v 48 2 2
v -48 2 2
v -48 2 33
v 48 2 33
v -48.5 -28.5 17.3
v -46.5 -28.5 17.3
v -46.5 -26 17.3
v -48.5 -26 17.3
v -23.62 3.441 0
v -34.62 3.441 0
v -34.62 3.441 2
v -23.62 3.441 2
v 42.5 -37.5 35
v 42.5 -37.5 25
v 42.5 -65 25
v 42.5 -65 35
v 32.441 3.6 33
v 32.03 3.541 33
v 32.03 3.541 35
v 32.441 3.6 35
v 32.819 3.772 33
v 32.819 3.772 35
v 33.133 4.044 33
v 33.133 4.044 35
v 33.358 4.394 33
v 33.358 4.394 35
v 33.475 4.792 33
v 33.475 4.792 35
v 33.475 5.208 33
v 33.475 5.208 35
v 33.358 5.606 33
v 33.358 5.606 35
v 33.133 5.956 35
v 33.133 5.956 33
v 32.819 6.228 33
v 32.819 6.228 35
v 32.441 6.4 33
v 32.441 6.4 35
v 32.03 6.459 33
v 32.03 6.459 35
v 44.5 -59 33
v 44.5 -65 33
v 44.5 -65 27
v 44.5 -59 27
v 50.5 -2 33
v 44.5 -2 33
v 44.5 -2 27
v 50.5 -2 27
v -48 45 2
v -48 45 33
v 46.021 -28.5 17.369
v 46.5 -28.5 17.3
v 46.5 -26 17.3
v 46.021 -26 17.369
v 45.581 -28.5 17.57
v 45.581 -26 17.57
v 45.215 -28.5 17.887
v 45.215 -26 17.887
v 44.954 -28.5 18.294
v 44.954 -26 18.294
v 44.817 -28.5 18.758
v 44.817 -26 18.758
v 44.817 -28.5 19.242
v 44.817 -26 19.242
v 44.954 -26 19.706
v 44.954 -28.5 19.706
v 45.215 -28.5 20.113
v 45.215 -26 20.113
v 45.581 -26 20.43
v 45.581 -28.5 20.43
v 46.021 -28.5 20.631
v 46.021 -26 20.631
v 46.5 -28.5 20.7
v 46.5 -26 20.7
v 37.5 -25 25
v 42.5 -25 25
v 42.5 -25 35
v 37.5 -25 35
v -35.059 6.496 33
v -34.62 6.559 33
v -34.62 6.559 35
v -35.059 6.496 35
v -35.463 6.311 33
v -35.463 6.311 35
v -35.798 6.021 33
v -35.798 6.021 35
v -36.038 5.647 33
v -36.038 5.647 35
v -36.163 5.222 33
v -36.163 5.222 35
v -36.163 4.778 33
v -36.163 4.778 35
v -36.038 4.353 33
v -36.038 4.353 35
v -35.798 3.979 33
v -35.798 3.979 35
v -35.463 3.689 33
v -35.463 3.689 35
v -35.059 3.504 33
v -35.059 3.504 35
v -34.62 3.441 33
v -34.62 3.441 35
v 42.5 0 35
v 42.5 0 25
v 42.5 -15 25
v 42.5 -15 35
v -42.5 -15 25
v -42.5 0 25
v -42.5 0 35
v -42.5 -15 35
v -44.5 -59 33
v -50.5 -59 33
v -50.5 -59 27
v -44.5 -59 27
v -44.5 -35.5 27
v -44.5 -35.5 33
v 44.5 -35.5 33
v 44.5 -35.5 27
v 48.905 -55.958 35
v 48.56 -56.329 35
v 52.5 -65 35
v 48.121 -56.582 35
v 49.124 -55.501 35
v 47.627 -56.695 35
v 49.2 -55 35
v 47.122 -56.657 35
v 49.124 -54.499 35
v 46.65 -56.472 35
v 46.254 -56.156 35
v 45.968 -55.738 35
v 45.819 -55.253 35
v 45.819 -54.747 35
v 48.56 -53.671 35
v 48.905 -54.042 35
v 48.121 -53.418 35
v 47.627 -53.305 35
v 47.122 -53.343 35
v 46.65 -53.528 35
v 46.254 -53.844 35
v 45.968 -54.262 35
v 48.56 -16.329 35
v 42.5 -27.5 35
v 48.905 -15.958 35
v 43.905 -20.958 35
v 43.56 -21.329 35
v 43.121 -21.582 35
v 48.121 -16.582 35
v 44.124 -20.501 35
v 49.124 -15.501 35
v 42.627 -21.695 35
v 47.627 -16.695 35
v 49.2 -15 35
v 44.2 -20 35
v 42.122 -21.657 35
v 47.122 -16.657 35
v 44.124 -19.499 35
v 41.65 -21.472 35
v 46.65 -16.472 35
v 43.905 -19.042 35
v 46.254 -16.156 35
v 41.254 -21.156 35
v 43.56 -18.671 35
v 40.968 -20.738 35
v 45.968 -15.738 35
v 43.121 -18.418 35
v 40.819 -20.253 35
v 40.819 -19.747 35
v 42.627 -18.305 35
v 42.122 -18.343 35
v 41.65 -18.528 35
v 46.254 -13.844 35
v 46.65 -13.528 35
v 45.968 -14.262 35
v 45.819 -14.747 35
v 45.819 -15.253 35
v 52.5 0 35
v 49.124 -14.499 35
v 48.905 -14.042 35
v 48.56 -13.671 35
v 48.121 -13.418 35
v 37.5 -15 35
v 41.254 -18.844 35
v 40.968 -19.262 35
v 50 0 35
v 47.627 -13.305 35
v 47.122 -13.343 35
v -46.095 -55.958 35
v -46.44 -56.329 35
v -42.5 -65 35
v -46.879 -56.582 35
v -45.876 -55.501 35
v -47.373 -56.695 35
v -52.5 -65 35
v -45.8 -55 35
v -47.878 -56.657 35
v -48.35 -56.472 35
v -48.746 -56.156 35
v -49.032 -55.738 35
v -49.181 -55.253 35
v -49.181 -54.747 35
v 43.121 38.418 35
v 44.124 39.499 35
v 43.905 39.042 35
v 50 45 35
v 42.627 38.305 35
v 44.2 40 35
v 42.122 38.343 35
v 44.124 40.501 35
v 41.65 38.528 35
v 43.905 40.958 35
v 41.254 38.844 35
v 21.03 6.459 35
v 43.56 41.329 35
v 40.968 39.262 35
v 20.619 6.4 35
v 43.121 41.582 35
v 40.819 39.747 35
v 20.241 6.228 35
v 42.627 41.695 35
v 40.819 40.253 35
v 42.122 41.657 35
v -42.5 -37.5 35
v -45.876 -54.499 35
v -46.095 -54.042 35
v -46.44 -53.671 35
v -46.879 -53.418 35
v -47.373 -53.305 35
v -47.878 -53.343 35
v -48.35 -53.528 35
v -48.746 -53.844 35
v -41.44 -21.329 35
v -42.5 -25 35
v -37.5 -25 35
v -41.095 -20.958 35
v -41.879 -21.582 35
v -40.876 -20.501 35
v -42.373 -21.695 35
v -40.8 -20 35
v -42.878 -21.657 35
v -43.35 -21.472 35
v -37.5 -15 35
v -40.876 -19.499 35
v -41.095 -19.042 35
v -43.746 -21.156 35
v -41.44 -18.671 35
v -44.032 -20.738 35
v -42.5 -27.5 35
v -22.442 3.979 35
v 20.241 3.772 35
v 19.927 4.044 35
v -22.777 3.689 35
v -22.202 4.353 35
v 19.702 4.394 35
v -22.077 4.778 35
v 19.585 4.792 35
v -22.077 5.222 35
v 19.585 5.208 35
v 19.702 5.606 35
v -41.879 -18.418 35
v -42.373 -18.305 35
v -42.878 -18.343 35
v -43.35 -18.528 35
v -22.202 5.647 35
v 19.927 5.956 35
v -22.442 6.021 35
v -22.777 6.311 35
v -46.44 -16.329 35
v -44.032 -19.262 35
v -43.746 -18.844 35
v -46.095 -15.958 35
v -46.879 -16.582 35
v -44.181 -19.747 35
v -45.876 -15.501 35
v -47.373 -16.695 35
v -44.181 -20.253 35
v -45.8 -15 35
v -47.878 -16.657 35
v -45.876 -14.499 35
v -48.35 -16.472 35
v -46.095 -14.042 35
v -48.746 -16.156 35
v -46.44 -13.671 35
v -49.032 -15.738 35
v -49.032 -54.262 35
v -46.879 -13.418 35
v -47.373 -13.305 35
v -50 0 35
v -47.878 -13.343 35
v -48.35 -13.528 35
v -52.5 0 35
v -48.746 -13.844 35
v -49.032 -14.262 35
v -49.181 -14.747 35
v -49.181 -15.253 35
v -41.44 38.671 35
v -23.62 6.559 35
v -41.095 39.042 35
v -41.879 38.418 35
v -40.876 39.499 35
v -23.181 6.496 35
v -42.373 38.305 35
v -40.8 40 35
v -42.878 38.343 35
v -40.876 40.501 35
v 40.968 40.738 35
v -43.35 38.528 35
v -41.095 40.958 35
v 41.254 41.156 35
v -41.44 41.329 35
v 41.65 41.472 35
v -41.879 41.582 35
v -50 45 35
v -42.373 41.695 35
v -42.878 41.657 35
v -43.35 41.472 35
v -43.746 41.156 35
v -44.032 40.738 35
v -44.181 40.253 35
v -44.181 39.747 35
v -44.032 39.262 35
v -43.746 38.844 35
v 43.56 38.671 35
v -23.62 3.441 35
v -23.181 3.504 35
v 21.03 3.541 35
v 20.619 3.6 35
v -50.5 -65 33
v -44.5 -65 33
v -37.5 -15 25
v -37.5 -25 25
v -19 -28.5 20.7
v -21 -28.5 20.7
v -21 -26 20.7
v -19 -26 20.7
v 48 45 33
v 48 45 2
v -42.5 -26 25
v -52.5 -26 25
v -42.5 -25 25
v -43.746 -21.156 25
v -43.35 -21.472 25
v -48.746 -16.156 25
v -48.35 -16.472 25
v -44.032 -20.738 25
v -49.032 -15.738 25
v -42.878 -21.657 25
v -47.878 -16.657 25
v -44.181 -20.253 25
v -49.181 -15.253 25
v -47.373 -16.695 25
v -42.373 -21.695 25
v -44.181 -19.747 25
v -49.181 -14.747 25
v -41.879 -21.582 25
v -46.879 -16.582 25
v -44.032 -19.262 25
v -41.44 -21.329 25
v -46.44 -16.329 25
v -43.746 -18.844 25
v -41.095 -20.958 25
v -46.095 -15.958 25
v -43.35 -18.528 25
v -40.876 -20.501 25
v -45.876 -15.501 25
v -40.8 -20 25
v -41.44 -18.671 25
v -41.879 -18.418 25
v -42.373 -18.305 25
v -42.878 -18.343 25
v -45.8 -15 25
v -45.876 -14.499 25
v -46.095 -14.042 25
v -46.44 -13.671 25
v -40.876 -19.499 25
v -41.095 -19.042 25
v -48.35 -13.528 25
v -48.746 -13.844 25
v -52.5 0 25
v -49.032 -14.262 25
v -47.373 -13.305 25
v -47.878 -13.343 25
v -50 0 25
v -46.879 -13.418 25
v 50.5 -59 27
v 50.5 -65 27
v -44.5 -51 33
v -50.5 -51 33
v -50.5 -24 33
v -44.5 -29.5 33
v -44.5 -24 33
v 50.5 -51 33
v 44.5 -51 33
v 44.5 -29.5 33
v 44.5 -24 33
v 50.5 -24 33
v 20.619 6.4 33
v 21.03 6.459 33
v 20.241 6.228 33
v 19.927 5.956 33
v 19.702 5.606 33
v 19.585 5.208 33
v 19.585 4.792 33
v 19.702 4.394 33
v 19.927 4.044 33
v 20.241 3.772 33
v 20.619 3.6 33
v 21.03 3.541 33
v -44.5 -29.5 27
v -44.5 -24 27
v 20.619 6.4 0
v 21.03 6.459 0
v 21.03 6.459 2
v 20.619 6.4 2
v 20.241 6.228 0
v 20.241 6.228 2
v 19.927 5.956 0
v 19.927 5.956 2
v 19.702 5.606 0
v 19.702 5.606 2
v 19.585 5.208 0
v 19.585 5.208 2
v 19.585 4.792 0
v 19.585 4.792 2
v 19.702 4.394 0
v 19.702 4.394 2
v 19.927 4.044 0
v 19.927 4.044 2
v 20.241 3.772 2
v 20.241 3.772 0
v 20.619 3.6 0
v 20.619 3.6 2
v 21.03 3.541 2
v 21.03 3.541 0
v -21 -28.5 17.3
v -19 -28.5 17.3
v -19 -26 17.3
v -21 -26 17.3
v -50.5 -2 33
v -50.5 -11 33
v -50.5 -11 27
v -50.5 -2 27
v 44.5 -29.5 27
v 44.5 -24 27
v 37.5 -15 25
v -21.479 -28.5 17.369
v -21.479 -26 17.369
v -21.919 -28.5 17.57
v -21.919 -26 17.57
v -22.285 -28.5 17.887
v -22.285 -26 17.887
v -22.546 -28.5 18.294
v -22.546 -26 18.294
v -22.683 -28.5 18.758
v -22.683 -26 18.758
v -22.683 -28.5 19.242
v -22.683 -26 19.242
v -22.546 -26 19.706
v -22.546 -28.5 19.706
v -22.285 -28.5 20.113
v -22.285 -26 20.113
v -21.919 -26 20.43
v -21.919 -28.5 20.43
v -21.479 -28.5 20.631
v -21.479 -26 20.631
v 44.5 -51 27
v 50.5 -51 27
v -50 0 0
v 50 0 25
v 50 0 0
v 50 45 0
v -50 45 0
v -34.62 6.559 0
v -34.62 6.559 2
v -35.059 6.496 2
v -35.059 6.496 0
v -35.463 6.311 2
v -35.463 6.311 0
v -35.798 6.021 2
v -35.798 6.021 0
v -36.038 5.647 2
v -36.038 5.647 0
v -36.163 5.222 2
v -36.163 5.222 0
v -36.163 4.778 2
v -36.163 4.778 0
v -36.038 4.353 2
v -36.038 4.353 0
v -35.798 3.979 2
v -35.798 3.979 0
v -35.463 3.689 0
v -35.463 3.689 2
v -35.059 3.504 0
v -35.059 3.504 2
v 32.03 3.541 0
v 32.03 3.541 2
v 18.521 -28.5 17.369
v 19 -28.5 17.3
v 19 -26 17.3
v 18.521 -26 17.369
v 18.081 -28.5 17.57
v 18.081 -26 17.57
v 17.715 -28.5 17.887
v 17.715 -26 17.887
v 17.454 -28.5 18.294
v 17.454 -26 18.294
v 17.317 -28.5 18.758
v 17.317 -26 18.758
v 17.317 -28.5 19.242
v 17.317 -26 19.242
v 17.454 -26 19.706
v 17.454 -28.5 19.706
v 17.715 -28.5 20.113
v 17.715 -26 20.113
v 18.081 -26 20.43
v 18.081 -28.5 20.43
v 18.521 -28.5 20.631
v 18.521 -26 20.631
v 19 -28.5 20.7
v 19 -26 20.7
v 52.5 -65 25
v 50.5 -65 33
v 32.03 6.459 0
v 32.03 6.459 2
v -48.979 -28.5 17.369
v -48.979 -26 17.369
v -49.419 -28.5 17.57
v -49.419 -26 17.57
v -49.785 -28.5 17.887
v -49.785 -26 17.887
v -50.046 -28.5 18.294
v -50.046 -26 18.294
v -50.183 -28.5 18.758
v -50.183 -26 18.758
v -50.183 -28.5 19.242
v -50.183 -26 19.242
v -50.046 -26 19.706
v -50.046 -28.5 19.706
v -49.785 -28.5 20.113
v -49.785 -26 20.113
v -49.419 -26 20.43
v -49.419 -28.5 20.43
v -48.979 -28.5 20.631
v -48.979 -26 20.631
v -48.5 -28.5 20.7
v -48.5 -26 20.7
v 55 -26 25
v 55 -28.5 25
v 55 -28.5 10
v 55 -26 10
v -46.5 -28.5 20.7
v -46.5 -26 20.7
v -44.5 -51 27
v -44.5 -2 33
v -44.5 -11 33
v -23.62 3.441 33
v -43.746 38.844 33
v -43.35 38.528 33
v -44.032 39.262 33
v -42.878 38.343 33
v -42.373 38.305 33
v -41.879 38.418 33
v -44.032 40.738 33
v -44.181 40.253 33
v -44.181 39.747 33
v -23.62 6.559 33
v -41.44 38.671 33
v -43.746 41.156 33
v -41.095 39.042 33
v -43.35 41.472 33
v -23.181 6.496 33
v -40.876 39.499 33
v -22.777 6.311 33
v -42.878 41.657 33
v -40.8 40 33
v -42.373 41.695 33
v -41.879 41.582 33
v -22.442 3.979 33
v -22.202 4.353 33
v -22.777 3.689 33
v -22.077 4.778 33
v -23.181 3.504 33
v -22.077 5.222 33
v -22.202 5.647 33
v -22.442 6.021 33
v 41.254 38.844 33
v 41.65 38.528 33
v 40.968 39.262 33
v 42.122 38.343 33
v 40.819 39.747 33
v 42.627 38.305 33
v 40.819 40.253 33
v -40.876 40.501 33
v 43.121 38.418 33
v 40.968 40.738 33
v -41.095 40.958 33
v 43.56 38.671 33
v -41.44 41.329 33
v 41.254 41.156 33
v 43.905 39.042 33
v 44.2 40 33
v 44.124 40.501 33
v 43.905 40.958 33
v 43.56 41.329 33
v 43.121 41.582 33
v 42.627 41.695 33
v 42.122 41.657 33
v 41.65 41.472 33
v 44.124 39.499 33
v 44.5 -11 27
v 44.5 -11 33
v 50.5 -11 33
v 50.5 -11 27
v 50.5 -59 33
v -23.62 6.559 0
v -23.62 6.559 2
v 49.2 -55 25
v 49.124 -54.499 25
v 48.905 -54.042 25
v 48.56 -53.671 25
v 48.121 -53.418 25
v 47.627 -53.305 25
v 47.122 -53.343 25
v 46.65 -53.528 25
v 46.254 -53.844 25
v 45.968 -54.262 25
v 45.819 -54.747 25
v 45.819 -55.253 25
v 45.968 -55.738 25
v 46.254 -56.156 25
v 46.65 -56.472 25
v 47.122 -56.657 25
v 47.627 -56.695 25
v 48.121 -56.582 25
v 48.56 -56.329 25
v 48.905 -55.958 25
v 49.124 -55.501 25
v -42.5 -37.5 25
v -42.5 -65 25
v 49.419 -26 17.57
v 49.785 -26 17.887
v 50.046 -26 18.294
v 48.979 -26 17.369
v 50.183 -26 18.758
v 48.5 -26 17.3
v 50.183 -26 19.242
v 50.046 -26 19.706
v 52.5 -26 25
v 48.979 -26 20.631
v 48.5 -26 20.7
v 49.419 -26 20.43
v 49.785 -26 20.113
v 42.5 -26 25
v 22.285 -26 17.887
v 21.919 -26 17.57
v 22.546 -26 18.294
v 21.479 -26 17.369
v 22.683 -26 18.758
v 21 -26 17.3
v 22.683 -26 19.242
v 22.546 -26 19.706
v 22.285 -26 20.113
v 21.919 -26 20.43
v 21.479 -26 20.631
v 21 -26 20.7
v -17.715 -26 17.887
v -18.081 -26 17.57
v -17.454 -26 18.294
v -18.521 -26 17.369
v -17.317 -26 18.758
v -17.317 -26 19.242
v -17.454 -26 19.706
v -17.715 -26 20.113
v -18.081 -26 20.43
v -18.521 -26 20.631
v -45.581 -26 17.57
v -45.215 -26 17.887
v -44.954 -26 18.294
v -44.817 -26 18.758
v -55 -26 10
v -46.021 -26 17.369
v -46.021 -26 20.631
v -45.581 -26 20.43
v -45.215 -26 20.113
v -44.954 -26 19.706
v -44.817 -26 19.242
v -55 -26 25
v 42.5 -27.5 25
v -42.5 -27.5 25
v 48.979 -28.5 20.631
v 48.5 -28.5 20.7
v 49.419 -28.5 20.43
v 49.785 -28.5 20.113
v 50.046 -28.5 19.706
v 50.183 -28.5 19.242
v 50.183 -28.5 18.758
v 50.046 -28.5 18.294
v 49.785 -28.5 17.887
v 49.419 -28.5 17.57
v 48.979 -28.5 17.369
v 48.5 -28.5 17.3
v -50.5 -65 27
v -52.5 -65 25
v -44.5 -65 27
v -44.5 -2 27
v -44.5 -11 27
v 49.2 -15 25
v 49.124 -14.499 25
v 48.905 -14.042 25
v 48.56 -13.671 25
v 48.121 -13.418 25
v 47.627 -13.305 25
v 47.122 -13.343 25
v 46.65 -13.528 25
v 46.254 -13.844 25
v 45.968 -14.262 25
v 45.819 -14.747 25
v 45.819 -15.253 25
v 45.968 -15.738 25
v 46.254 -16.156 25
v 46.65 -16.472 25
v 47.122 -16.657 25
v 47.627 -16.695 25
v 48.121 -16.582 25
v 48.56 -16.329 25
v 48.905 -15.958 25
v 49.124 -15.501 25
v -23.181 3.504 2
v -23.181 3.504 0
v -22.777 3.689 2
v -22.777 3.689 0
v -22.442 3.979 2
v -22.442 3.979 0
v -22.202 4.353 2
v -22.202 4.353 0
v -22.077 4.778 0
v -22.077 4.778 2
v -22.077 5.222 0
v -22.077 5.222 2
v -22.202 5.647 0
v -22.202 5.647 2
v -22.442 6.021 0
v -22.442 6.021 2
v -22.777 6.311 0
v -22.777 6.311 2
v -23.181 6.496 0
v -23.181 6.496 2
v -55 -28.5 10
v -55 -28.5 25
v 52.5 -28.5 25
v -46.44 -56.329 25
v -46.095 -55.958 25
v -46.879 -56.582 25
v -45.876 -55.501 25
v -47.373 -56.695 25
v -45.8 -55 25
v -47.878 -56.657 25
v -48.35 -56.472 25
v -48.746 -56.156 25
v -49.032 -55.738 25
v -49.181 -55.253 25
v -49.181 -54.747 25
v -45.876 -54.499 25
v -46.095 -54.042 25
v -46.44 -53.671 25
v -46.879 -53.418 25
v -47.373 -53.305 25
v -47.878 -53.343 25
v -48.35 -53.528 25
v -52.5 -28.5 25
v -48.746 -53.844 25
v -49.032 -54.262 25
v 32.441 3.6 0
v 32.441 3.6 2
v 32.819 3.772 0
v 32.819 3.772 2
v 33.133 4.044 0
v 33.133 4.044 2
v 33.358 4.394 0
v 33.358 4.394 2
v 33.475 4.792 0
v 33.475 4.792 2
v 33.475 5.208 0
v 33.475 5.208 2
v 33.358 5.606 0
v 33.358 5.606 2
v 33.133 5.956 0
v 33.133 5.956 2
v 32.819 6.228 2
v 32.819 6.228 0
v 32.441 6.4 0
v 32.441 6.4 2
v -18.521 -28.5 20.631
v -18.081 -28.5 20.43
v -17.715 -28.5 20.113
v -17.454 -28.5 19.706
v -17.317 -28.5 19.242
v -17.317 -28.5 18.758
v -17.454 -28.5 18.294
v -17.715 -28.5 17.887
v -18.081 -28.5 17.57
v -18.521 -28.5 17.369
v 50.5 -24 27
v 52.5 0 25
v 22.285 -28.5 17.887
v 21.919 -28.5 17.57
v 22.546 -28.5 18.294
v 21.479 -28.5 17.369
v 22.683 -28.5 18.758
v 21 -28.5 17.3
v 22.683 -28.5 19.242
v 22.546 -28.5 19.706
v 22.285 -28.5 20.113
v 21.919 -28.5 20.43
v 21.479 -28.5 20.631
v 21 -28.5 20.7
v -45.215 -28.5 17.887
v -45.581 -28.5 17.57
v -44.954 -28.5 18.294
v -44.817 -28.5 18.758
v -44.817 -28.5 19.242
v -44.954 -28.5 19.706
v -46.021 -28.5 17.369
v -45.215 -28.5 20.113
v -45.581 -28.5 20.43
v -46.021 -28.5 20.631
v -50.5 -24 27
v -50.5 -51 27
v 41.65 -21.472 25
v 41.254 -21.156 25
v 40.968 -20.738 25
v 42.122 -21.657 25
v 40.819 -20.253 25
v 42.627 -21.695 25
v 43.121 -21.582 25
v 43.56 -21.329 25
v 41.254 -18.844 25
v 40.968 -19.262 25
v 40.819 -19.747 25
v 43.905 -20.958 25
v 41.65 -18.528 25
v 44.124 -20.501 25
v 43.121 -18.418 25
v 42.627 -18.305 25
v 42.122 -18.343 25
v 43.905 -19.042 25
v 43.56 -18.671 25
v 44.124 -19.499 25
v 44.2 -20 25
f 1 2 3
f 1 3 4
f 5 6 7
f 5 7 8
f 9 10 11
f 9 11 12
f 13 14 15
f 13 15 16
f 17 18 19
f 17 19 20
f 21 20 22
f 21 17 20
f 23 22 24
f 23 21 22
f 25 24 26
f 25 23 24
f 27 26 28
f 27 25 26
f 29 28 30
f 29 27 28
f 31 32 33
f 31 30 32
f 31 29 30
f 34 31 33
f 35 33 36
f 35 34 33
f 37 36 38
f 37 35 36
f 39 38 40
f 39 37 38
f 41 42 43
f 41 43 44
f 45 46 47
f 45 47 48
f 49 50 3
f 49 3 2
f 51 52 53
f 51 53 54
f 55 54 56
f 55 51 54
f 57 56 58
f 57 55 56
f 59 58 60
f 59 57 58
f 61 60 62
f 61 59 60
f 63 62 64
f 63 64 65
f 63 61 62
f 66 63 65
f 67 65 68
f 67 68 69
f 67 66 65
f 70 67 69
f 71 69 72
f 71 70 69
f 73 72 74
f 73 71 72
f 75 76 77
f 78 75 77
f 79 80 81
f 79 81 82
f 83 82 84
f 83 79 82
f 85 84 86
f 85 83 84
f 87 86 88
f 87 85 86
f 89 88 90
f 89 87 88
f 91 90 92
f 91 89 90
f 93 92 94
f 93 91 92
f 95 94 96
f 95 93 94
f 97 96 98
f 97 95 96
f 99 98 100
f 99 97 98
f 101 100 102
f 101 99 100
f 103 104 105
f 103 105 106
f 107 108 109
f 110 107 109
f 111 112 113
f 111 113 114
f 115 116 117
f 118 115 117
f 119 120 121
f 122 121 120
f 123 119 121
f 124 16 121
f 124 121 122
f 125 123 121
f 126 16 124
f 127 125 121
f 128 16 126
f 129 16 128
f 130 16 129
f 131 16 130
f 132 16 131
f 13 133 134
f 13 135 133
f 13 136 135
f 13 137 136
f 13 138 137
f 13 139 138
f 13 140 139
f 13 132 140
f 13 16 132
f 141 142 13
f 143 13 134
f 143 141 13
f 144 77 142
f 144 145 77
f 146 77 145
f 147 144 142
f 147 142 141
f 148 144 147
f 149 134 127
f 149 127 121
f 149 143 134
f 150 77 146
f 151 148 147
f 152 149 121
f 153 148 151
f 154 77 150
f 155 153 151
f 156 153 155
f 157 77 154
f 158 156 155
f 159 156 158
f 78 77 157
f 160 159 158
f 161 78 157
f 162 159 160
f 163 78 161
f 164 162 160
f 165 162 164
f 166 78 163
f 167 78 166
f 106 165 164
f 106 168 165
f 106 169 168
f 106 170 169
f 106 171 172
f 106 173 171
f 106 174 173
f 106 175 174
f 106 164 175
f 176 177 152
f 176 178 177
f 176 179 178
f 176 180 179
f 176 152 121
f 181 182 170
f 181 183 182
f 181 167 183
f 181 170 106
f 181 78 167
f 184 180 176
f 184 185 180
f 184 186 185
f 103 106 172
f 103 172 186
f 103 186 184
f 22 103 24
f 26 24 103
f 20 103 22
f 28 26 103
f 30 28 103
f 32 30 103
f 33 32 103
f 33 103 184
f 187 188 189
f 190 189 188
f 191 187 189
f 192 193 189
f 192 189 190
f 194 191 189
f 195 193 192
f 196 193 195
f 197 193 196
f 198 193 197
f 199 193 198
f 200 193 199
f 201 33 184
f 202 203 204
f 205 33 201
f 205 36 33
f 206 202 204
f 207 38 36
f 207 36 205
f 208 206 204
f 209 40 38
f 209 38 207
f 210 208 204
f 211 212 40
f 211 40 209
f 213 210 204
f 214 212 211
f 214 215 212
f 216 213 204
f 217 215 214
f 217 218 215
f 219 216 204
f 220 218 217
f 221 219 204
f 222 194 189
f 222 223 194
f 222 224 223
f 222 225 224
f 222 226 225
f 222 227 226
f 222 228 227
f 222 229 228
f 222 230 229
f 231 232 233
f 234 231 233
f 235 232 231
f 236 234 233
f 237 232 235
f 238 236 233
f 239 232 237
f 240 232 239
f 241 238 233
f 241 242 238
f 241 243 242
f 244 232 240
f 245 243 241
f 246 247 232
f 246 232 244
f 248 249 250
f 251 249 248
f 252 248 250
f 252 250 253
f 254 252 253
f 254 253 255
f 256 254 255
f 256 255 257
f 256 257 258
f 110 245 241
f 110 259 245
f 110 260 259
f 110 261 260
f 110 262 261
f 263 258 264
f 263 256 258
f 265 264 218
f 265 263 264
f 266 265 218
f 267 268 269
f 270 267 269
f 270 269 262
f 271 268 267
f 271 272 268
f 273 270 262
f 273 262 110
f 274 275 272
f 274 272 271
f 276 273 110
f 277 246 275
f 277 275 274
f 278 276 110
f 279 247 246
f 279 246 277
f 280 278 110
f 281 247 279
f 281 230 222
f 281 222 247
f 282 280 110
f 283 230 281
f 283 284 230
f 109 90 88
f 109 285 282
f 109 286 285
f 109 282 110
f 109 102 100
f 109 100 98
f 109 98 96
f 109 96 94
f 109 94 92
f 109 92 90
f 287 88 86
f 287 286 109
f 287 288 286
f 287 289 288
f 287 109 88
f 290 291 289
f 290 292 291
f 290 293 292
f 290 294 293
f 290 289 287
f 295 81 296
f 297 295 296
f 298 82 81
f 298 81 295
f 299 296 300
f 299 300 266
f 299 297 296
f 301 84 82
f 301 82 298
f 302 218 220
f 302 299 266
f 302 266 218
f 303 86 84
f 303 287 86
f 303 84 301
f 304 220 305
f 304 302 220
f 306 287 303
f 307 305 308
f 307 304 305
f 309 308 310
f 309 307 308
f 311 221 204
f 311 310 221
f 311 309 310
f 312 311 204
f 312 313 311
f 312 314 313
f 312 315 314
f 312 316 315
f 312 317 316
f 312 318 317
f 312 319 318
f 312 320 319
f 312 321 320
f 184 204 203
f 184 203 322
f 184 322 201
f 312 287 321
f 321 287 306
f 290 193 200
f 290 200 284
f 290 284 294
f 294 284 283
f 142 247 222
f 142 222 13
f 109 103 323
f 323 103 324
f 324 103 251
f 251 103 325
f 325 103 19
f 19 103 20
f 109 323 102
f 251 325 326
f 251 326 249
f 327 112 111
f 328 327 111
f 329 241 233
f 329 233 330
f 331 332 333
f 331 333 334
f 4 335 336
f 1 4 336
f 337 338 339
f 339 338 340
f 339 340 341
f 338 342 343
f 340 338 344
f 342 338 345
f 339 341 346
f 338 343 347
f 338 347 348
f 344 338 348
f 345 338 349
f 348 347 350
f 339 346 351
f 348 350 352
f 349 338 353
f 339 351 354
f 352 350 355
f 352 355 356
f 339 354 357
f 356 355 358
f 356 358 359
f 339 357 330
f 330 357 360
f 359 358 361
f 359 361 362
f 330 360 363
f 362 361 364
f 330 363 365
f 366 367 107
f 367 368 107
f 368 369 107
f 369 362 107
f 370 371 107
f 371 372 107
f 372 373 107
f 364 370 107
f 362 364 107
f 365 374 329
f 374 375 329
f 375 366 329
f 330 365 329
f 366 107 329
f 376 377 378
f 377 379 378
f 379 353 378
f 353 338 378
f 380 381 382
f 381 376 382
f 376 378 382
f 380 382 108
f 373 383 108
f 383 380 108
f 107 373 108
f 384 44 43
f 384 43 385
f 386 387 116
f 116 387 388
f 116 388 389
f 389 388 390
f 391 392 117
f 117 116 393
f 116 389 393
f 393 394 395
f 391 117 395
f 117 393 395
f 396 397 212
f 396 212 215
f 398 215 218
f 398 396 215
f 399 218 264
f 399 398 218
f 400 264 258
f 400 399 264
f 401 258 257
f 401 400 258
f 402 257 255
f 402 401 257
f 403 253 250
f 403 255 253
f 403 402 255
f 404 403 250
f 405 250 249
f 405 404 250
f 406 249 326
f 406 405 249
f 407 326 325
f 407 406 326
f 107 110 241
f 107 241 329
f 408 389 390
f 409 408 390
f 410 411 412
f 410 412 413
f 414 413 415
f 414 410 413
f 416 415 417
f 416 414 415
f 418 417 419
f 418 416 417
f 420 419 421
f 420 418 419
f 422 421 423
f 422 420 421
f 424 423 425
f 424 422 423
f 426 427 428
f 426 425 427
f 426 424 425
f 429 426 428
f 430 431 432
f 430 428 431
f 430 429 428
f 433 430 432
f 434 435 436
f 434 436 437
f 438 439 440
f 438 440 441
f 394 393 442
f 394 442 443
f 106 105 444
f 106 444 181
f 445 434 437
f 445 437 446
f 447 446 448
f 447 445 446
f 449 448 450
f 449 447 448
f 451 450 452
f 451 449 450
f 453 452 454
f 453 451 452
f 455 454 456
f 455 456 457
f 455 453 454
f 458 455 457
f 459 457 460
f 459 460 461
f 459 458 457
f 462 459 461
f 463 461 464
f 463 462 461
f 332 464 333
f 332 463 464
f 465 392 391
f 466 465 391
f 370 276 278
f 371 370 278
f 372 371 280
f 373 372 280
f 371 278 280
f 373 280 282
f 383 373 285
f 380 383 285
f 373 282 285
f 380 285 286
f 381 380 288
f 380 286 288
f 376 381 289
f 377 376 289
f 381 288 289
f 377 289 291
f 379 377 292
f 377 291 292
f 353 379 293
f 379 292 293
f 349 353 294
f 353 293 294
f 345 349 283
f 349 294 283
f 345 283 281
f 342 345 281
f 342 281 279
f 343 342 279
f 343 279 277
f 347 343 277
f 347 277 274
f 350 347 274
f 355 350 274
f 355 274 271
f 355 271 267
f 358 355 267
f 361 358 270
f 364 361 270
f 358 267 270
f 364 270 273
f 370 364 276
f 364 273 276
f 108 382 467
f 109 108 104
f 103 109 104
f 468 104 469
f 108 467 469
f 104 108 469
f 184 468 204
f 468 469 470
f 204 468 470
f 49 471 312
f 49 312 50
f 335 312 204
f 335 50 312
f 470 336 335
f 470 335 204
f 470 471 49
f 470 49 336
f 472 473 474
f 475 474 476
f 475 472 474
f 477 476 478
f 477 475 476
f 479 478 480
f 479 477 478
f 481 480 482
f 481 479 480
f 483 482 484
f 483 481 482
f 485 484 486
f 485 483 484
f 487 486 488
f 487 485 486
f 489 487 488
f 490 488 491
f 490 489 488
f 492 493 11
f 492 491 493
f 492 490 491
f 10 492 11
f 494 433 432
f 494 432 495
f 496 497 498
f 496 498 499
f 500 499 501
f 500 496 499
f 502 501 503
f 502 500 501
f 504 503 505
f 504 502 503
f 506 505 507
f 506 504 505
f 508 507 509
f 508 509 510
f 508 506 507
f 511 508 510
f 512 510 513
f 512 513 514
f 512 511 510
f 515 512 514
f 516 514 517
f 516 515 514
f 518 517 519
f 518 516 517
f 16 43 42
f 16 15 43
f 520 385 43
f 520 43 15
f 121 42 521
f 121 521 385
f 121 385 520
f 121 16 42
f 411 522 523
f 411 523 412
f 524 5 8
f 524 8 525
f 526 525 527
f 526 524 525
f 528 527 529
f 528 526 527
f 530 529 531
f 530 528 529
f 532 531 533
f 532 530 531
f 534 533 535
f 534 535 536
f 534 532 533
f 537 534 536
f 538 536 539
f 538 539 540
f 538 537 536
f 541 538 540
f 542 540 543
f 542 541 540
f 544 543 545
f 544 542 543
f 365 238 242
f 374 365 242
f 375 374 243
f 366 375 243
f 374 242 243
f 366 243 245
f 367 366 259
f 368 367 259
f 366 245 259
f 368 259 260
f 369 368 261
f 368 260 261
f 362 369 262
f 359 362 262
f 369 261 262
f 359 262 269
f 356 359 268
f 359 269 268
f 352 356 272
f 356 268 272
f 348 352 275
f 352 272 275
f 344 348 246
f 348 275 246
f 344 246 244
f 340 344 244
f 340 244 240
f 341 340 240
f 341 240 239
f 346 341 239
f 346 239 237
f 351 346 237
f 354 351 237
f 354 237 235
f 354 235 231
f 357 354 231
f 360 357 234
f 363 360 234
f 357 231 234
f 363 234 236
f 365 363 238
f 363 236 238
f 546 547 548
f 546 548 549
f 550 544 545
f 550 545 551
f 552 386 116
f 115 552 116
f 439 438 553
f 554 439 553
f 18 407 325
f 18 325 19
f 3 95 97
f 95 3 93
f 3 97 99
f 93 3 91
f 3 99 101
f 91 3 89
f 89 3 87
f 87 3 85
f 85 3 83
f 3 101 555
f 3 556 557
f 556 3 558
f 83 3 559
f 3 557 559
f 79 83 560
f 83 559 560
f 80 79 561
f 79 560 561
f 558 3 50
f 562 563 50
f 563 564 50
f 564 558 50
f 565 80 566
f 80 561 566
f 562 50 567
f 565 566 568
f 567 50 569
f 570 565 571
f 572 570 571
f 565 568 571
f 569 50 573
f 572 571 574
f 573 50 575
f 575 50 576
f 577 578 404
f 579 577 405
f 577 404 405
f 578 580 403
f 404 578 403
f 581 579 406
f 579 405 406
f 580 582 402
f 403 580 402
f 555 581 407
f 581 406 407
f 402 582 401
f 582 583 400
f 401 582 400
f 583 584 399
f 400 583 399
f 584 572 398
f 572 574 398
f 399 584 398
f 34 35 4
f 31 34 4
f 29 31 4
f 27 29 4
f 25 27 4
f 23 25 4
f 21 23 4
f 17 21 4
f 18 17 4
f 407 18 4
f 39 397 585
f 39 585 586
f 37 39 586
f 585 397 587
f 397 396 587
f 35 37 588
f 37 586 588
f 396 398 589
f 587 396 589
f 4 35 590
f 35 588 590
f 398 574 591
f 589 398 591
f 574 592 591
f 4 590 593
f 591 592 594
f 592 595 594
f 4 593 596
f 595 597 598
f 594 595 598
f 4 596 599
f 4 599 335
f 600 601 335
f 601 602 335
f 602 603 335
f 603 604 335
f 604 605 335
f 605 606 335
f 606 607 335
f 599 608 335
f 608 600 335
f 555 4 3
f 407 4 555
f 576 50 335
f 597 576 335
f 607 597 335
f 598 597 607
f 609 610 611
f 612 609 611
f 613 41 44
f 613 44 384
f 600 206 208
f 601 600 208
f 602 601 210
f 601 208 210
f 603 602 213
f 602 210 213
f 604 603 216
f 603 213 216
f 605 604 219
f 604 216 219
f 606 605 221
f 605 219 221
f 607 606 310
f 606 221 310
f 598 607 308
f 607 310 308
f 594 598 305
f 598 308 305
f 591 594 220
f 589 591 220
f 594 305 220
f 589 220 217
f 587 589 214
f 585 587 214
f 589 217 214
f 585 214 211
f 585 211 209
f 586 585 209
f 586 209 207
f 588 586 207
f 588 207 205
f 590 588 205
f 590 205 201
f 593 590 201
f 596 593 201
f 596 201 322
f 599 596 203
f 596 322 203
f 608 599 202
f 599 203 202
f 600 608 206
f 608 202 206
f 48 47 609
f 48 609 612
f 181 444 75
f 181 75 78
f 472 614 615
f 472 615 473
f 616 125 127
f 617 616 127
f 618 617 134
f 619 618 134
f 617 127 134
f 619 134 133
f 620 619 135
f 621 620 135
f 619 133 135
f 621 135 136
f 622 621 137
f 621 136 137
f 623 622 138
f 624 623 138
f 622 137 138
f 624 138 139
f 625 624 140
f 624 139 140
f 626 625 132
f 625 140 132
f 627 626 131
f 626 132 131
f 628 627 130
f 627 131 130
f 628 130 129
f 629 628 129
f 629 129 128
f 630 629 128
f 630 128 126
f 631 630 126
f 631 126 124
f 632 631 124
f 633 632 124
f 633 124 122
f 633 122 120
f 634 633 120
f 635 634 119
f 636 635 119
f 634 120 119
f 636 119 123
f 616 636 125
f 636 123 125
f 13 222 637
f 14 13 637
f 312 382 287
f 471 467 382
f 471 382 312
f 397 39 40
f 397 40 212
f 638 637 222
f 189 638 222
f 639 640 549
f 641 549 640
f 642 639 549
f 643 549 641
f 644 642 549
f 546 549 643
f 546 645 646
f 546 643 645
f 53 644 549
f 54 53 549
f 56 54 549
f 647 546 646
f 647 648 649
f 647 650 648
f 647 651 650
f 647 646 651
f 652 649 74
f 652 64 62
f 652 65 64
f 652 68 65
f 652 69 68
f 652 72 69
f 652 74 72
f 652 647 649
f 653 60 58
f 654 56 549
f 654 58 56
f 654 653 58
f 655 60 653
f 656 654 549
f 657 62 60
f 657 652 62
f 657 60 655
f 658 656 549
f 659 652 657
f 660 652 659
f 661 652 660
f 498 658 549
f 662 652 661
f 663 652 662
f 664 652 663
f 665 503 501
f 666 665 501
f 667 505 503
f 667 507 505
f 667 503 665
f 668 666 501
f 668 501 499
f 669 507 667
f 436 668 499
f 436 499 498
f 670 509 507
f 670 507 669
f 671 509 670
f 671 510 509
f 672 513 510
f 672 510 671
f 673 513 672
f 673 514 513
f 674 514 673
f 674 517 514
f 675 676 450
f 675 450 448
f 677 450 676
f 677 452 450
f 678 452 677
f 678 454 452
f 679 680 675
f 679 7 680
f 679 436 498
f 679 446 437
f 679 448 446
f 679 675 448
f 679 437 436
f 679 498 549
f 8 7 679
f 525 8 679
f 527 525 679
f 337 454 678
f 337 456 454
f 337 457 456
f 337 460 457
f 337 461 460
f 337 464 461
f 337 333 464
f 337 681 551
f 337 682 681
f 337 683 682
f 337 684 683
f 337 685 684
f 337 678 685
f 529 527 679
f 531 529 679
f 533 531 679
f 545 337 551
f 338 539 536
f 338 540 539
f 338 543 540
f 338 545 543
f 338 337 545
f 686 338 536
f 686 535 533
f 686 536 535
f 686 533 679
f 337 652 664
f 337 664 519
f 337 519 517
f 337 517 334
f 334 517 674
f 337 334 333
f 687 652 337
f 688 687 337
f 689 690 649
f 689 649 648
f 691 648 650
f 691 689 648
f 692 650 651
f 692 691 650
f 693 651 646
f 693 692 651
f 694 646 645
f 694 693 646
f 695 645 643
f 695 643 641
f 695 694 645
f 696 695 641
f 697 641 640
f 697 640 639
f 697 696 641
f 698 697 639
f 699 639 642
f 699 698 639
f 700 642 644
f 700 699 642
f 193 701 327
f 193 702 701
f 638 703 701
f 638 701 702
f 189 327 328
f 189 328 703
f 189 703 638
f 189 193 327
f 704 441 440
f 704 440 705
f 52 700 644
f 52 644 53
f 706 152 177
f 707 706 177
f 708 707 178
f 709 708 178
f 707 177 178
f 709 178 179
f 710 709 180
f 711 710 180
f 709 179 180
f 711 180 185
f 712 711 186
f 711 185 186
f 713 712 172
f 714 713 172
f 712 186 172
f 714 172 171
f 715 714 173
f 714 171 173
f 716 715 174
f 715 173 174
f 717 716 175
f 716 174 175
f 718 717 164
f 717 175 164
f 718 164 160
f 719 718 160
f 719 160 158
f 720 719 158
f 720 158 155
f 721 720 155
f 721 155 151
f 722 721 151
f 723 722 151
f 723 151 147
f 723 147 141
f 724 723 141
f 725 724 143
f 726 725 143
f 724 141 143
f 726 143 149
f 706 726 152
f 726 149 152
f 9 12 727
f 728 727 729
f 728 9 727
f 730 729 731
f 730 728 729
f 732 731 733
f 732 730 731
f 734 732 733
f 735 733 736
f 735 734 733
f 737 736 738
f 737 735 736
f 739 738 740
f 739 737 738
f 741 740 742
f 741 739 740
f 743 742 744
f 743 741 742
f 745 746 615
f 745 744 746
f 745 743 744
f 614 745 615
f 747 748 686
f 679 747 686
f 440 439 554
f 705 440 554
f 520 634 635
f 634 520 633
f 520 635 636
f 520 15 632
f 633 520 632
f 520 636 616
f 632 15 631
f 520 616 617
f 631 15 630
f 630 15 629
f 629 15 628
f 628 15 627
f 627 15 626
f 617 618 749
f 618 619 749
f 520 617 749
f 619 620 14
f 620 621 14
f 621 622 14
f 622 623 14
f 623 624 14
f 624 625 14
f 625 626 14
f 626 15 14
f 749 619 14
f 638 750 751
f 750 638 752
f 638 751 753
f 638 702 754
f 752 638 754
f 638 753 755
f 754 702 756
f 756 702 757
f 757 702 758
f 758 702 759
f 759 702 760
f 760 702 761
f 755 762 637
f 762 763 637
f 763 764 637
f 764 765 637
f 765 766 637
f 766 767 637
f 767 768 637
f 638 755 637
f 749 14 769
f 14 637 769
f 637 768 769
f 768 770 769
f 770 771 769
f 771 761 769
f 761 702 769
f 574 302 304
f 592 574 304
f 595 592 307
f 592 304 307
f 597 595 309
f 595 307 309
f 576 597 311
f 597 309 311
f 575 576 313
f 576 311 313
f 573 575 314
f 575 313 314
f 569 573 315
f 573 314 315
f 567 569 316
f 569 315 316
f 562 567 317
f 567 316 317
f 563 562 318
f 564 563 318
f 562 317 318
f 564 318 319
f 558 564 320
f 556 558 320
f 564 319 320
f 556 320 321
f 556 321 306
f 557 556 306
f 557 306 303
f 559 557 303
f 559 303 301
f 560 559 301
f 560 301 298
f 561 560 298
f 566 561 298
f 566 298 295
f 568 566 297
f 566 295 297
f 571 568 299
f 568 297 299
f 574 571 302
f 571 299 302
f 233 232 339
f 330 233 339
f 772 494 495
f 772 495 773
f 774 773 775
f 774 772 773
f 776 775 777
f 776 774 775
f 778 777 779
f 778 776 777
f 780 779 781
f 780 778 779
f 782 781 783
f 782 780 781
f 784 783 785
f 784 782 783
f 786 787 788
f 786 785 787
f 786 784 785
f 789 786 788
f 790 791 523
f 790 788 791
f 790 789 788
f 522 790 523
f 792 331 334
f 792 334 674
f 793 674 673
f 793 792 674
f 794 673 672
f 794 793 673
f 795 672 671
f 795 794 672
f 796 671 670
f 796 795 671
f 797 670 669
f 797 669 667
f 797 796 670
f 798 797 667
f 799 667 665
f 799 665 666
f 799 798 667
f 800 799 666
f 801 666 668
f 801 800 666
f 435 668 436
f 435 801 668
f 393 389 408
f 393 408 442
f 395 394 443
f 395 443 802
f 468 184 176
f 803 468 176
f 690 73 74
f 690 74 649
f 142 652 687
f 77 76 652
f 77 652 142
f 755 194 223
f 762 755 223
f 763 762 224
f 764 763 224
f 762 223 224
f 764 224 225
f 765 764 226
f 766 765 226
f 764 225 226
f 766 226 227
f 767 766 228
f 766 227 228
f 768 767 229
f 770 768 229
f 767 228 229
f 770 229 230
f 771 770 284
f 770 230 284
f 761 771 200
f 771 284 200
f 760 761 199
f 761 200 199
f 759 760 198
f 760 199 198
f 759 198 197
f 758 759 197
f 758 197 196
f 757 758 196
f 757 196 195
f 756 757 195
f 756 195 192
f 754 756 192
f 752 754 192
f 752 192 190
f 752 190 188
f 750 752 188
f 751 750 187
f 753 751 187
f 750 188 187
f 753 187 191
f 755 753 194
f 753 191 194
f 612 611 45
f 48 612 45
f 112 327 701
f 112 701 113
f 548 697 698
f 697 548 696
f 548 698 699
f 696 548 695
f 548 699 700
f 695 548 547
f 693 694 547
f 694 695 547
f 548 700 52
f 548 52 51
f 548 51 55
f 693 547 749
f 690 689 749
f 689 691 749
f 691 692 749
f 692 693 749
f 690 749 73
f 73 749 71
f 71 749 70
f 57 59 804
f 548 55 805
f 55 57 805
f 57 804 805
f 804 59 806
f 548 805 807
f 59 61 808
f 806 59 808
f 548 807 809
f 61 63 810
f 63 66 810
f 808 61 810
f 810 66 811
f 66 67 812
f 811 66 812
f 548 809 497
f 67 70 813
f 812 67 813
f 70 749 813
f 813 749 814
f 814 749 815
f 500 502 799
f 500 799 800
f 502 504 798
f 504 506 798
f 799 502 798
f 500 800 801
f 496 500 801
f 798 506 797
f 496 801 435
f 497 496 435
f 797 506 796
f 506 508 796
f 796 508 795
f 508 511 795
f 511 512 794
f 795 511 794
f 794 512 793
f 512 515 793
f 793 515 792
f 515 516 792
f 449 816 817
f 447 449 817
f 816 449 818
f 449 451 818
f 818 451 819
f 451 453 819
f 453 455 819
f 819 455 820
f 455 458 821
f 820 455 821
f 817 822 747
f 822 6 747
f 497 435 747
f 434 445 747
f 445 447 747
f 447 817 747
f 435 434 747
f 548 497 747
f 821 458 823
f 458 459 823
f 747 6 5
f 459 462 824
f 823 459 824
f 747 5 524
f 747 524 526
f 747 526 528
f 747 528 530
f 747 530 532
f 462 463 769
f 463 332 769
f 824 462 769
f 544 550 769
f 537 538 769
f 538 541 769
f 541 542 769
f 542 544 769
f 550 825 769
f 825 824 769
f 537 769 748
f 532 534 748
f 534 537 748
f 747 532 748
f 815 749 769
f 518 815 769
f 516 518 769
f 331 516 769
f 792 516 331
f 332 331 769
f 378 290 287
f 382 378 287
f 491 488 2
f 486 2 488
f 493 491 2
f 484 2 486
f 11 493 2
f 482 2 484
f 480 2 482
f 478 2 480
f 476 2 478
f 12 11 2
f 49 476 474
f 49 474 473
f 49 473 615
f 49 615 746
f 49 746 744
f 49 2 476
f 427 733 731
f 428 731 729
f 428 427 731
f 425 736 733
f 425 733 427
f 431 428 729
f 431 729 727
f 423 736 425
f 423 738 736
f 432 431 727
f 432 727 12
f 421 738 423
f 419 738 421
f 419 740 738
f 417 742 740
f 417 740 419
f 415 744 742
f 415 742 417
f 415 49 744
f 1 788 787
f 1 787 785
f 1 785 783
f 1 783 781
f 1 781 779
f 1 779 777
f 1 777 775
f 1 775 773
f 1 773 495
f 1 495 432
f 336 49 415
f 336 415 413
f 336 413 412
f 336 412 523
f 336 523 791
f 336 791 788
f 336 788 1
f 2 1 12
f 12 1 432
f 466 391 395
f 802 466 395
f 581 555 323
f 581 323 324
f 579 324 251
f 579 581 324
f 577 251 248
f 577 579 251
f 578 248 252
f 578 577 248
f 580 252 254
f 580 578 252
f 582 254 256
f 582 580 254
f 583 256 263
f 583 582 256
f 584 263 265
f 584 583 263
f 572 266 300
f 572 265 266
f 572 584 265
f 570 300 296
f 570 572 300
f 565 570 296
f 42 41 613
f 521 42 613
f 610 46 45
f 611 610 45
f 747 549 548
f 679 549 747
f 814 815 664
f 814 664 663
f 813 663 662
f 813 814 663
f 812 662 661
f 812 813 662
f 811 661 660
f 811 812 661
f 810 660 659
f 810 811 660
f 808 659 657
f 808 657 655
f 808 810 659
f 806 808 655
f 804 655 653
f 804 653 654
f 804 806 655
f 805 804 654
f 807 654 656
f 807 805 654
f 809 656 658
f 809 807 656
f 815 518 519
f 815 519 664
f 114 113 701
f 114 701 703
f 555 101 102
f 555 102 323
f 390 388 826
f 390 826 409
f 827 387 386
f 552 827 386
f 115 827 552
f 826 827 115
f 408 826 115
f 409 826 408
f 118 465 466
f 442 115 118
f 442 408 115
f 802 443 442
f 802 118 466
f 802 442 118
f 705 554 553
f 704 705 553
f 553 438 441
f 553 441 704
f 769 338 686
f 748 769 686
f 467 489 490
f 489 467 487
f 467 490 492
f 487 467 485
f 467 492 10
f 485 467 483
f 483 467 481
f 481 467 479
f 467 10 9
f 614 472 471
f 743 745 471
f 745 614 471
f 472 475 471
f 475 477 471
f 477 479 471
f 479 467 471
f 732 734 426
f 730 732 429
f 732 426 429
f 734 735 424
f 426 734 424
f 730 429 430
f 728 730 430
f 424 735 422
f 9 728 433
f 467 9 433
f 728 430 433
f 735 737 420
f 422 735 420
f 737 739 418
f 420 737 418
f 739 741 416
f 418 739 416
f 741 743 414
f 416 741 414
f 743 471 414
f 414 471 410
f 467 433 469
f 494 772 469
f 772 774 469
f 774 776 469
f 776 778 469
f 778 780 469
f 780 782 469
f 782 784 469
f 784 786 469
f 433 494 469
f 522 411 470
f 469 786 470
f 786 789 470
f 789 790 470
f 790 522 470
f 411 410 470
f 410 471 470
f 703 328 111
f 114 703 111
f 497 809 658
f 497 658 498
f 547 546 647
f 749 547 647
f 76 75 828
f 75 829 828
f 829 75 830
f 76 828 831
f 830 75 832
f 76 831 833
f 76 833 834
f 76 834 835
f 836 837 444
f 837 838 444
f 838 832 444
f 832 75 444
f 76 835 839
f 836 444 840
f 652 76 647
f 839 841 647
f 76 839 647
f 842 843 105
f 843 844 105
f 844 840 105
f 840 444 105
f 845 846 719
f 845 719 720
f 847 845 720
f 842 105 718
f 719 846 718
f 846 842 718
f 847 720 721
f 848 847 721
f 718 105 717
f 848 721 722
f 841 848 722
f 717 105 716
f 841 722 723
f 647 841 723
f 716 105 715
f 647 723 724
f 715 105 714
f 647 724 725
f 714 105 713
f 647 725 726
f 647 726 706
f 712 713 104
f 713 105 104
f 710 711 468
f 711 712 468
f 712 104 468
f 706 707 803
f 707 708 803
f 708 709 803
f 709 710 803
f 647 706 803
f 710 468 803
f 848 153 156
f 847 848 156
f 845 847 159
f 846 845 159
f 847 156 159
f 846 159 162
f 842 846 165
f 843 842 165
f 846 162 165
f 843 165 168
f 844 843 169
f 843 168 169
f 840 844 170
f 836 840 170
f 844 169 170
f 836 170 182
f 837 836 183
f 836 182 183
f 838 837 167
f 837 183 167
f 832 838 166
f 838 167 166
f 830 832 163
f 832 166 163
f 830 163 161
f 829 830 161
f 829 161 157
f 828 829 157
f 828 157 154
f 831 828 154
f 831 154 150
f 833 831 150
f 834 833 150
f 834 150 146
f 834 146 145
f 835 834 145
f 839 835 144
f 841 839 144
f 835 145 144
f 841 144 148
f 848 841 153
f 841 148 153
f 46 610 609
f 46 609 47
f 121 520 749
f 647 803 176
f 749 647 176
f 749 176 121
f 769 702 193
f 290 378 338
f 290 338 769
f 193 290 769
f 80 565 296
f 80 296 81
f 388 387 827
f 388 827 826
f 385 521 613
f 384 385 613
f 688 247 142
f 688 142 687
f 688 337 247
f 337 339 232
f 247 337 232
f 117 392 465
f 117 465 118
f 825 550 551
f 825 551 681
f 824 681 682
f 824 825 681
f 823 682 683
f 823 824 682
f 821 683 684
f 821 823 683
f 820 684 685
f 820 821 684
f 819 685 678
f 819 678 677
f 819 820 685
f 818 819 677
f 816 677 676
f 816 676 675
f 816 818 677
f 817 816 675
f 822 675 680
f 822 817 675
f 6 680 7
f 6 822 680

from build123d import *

# Parameters (mm, degrees)
V3_BOX_FOOTPRINT_100_X_45_MM_W                 = 100
V3_BOX_FOOTPRINT_100_X_45_MM_H                 = 45
V3_BOX_HEIGHT_35_MM_DEPTH                      = 35
V3_REAR_OPENING_96_X_31_MM_W                   = 96
V3_REAR_OPENING_96_X_31_MM_H                   = 31
V3_CAVITY_ALL_WALLS_2_MM_DEPTH                 = 43
V3_SQUARE_BEAMS_10_X_10_PITCH_95_MM_W          = 10
V3_SQUARE_BEAMS_10_X_10_PITCH_95_MM_H          = 10
V3_FORWARD_BEAM_LENGTH_65_MM_DEPTH             = 65
V3_LEFT_PCB_EAR_PROFILE_W                      = 10
V3_LEFT_PCB_EAR_PROFILE_H                      = 10
V3_LEFT_INWARD_EAR_5_MM_DEPTH                  = 5
V3_RIGHT_PCB_EAR_PROFILE_W                     = 10
V3_RIGHT_PCB_EAR_PROFILE_H                     = 10
V3_RIGHT_INWARD_EAR_5_MM_DEPTH                 = 5
V3_PCB_ROOF_PAIR_PITCH_85_MM_R                 = 1.7
V3_M3_ROOF_HOLES_DIAMETER_3_4_MM_DEPTH         = 2
V3_PCB_FORWARD_PAIR_ROW_SPACING_60_MM_R        = 1.7
V3_M3_PCB_EAR_HOLES_DEPTH                      = 10
V3_CHASSIS_TOP_HOLES_WIDTH_95_DEPTH_40_M_R     = 1.7
V3_M3_BEAM_TOP_BOTTOM_HOLES_DEPTH              = 10
V3_HANGING_PLATE_OFFSET_26_THICKNESS_2_5_W     = 110
V3_HANGING_PLATE_OFFSET_26_THICKNESS_2_5_H     = 2.5
V3_MOUNTING_PLATE_DOWNWARD_15_MM_WIDTH_1_DEPTH = 15
FOUR_HORIZONTAL_SLOTS_3_4_X_5_4_MM_DEPTH       = 2.5
CUT_EXTRUDE_1_DEPTH                            = 93.059763198
H_CROSSMEMBER_10_X_10_MM_AT_BEAM_MIDPOIN_W     = 10
H_CROSSMEMBER_10_X_10_MM_AT_BEAM_MIDPOIN_H     = 10
H_CROSSMEMBER_85_MM_DEPTH                      = 85
LONGITUDINAL_START                             = -2
BEAM_CAVITIES_6_MM_WIDE_PRESERVING_SCREW_W     = 6
BEAM_CAVITIES_6_MM_WIDE_PRESERVING_SCREW_H     = 6
BEAM_CAVITIES_6_MM_WIDE_PRESERVING_SCREW_H_2   = 27
BEAM_CAVITIES_6_MM_WIDE_PRESERVING_SCREW_H_3   = 9
LONGITUDINAL_BEAM_WALLS_2_MM_INNER_HEI_DEPTH   = 6
H_START                                        = -2
H_CROSSMEMBER_CAVITY_CONNECTS_BOTH_BEAM_W      = 89
H_CROSSMEMBER_CAVITY_CONNECTS_BOTH_BEAM_H      = 6
H_CROSSMEMBER_WALLS_2_MM_DEPTH                 = 6


with BuildPart() as part:
    # V3 box footprint 100 x 45 mm → V3 box height 35 mm (new body)
    with BuildSketch(Plane.XY):
        with Locations((0, 22.5)):
            Rectangle(V3_BOX_FOOTPRINT_100_X_45_MM_W, V3_BOX_FOOTPRINT_100_X_45_MM_H)
    extrude(amount=V3_BOX_HEIGHT_35_MM_DEPTH)

    # V3 rear opening 96 x 31 mm → V3 cavity all walls 2 mm (cut)
    with BuildSketch(Plane(origin=(0, 45, 0), x_dir=(1, 0, 0), z_dir=(0, 1, 0))):
        with Locations((0, -17.5)):
            Rectangle(V3_REAR_OPENING_96_X_31_MM_W, V3_REAR_OPENING_96_X_31_MM_H)
    extrude(amount=-V3_CAVITY_ALL_WALLS_2_MM_DEPTH, mode=Mode.SUBTRACT)

    # V3 square beams 10 x 10 pitch 95 mm → V3 forward beam length 65 mm (add)
    with BuildSketch(Plane.XZ):
        with Locations((-47.5, 30)):
            Rectangle(V3_SQUARE_BEAMS_10_X_10_PITCH_95_MM_W, V3_SQUARE_BEAMS_10_X_10_PITCH_95_MM_H)
        with Locations((47.5, 30)):
            Rectangle(V3_SQUARE_BEAMS_10_X_10_PITCH_95_MM_W, V3_SQUARE_BEAMS_10_X_10_PITCH_95_MM_H)
    extrude(amount=V3_FORWARD_BEAM_LENGTH_65_MM_DEPTH)

    # V3 left PCB ear profile → V3 left inward ear 5 mm (add)
    with BuildSketch(Plane(origin=(-42.5, 0, 0), x_dir=(0, 0, -1), z_dir=(1, 0, 0))):
        with Locations((-30, -20)):
            Rectangle(V3_LEFT_PCB_EAR_PROFILE_W, V3_LEFT_PCB_EAR_PROFILE_H)
    extrude(amount=V3_LEFT_INWARD_EAR_5_MM_DEPTH)

    # V3 right PCB ear profile → V3 right inward ear 5 mm (add)
    with BuildSketch(Plane.ZY.offset(-42.5)):
        with Locations((30, -20)):
            Rectangle(V3_RIGHT_PCB_EAR_PROFILE_W, V3_RIGHT_PCB_EAR_PROFILE_H)
    extrude(amount=V3_RIGHT_INWARD_EAR_5_MM_DEPTH)

    # V3 PCB roof pair pitch 85 mm → V3 M3 roof holes diameter 3.4 mm (cut)
    with BuildSketch(Plane.XY.offset(35)):
        with Locations((-42.5, 40)):
            Circle(V3_PCB_ROOF_PAIR_PITCH_85_MM_R)
        with Locations((42.5, 40)):
            Circle(V3_PCB_ROOF_PAIR_PITCH_85_MM_R)
    extrude(amount=-V3_M3_ROOF_HOLES_DIAMETER_3_4_MM_DEPTH, mode=Mode.SUBTRACT)

    # V3 PCB forward pair row spacing 60 mm → V3 M3 PCB ear holes (cut)
    with BuildSketch(Plane.XY.offset(35)):
        with Locations((-42.5, -20)):
            Circle(V3_PCB_FORWARD_PAIR_ROW_SPACING_60_MM_R)
        with Locations((42.5, -20)):
            Circle(V3_PCB_FORWARD_PAIR_ROW_SPACING_60_MM_R)
    extrude(amount=-V3_M3_PCB_EAR_HOLES_DEPTH, mode=Mode.SUBTRACT)

    # V3 chassis top holes width 95 depth 40 mm → V3 M3 beam top bottom holes (cut)
    with BuildSketch(Plane.XY.offset(35)):
        with Locations((-47.5, -55)):
            Circle(V3_CHASSIS_TOP_HOLES_WIDTH_95_DEPTH_40_M_R)
        with Locations((-47.5, -15)):
            Circle(V3_CHASSIS_TOP_HOLES_WIDTH_95_DEPTH_40_M_R)
        with Locations((47.5, -55)):
            Circle(V3_CHASSIS_TOP_HOLES_WIDTH_95_DEPTH_40_M_R)
        with Locations((47.5, -15)):
            Circle(V3_CHASSIS_TOP_HOLES_WIDTH_95_DEPTH_40_M_R)
    extrude(amount=-V3_M3_BEAM_TOP_BOTTOM_HOLES_DEPTH, mode=Mode.SUBTRACT)

    # V3 hanging plate offset 26 thickness 2.5 mm → V3 mounting plate downward 15 mm width 110 (add)
    with BuildSketch(Plane(origin=(0, 0, 25), x_dir=(-1, 0, 0), z_dir=(0, 0, -1))):
        with Locations((0, -27.25)):
            Rectangle(V3_HANGING_PLATE_OFFSET_26_THICKNESS_2_5_W, V3_HANGING_PLATE_OFFSET_26_THICKNESS_2_5_H)
    extrude(amount=V3_MOUNTING_PLATE_DOWNWARD_15_MM_WIDTH_1_DEPTH)

    # V3 slots 6 mm below beam underside centers 20 and 47.5 → Four horizontal slots 3.4 x 5.4 mm (cut)
    with BuildSketch(Plane.XZ.offset(28.5)):
        with BuildLine():
            Line((-48.5, 20.7), (-46.5, 20.7))
            ThreePointArc((-46.5, 20.7), (-44.8, 19), (-46.5, 17.3))
            Line((-46.5, 17.3), (-48.5, 17.3))
            ThreePointArc((-48.5, 17.3), (-50.2, 19), (-48.5, 20.7))
        make_face()
        with BuildLine():
            Line((-21, 20.7), (-19, 20.7))
            ThreePointArc((-19, 20.7), (-17.3, 19), (-19, 17.3))
            Line((-19, 17.3), (-21, 17.3))
            ThreePointArc((-21, 17.3), (-22.7, 19), (-21, 20.7))
        make_face()
        with BuildLine():
            Line((19, 20.7), (21, 20.7))
            ThreePointArc((21, 20.7), (22.7, 19), (21, 17.3))
            Line((21, 17.3), (19, 17.3))
            ThreePointArc((19, 17.3), (17.3, 19), (19, 20.7))
        make_face()
        with BuildLine():
            Line((46.5, 20.7), (48.5, 20.7))
            ThreePointArc((48.5, 20.7), (50.2, 19), (48.5, 17.3))
            Line((48.5, 17.3), (46.5, 17.3))
            ThreePointArc((46.5, 17.3), (44.8, 19), (46.5, 20.7))
        make_face()
    extrude(amount=-FOUR_HORIZONTAL_SLOTS_3_4_X_5_4_MM_DEPTH, mode=Mode.SUBTRACT)

    # 草图2 → 切除-拉伸1 (cut, through all)
    with BuildSketch(Plane(origin=(0, 0, 0), x_dir=(-1, 0, 0), z_dir=(0, 0, -1))):
        with BuildLine():
            Line((-32.029979042, 6.459471041), (-21.029979042, 6.459471041))
            ThreePointArc((-21.029979042, 6.459471041), (-19.570508001, 5), (-21.029979042, 3.540528959))
            Line((-21.029979042, 3.540528959), (-32.029979042, 3.540528959))
            ThreePointArc((-32.029979042, 3.540528959), (-33.489450083, 5), (-32.029979042, 6.459471041))
        make_face()
        with BuildLine():
            Line((23.620107008, 6.558669056), (34.620107008, 6.558669056))
            ThreePointArc((34.620107008, 6.558669056), (36.178776063, 5), (34.620107008, 3.441330944))
            Line((34.620107008, 3.441330944), (23.620107008, 3.441330944))
            ThreePointArc((23.620107008, 3.441330944), (22.061437952, 5), (23.620107008, 6.558669056))
        make_face()
    extrude(amount=-CUT_EXTRUDE_1_DEPTH, mode=Mode.SUBTRACT)

    # H crossmember 10 x 10 mm at beam midpoint → H crossmember 85 mm (add)
    with BuildSketch(Plane(origin=(-42.5, 0, 0), x_dir=(0, 0, -1), z_dir=(1, 0, 0))):
        with Locations((-30, -32.5)):
            Rectangle(H_CROSSMEMBER_10_X_10_MM_AT_BEAM_MIDPOIN_W, H_CROSSMEMBER_10_X_10_MM_AT_BEAM_MIDPOIN_H)
    extrude(amount=H_CROSSMEMBER_85_MM_DEPTH)

    # Beam cavities 6 mm wide preserving screw collars → Longitudinal beam walls 2 mm - inner height 6 mm (cut)
    with BuildSketch(Plane.XY.offset(35).offset(LONGITUDINAL_START)):
        with Locations((-47.5, -62)):
            Rectangle(BEAM_CAVITIES_6_MM_WIDE_PRESERVING_SCREW_W, BEAM_CAVITIES_6_MM_WIDE_PRESERVING_SCREW_H)
        with Locations((-47.5, -37.5)):
            Rectangle(BEAM_CAVITIES_6_MM_WIDE_PRESERVING_SCREW_W, BEAM_CAVITIES_6_MM_WIDE_PRESERVING_SCREW_H_2)
        with Locations((-47.5, -6.5)):
            Rectangle(BEAM_CAVITIES_6_MM_WIDE_PRESERVING_SCREW_W, BEAM_CAVITIES_6_MM_WIDE_PRESERVING_SCREW_H_3)
        with Locations((47.5, -62)):
            Rectangle(BEAM_CAVITIES_6_MM_WIDE_PRESERVING_SCREW_W, BEAM_CAVITIES_6_MM_WIDE_PRESERVING_SCREW_H)
        with Locations((47.5, -37.5)):
            Rectangle(BEAM_CAVITIES_6_MM_WIDE_PRESERVING_SCREW_W, BEAM_CAVITIES_6_MM_WIDE_PRESERVING_SCREW_H_2)
        with Locations((47.5, -6.5)):
            Rectangle(BEAM_CAVITIES_6_MM_WIDE_PRESERVING_SCREW_W, BEAM_CAVITIES_6_MM_WIDE_PRESERVING_SCREW_H_3)
    extrude(amount=-LONGITUDINAL_BEAM_WALLS_2_MM_INNER_HEI_DEPTH, mode=Mode.SUBTRACT)

    # H crossmember cavity connects both beam cavities → H crossmember walls 2 mm (cut)
    with BuildSketch(Plane.XY.offset(35).offset(H_START)):
        with Locations((0, -32.5)):
            Rectangle(H_CROSSMEMBER_CAVITY_CONNECTS_BOTH_BEAM_W, H_CROSSMEMBER_CAVITY_CONNECTS_BOTH_BEAM_H)
    extrude(amount=-H_CROSSMEMBER_WALLS_2_MM_DEPTH, mode=Mode.SUBTRACT)


solid = part.part
